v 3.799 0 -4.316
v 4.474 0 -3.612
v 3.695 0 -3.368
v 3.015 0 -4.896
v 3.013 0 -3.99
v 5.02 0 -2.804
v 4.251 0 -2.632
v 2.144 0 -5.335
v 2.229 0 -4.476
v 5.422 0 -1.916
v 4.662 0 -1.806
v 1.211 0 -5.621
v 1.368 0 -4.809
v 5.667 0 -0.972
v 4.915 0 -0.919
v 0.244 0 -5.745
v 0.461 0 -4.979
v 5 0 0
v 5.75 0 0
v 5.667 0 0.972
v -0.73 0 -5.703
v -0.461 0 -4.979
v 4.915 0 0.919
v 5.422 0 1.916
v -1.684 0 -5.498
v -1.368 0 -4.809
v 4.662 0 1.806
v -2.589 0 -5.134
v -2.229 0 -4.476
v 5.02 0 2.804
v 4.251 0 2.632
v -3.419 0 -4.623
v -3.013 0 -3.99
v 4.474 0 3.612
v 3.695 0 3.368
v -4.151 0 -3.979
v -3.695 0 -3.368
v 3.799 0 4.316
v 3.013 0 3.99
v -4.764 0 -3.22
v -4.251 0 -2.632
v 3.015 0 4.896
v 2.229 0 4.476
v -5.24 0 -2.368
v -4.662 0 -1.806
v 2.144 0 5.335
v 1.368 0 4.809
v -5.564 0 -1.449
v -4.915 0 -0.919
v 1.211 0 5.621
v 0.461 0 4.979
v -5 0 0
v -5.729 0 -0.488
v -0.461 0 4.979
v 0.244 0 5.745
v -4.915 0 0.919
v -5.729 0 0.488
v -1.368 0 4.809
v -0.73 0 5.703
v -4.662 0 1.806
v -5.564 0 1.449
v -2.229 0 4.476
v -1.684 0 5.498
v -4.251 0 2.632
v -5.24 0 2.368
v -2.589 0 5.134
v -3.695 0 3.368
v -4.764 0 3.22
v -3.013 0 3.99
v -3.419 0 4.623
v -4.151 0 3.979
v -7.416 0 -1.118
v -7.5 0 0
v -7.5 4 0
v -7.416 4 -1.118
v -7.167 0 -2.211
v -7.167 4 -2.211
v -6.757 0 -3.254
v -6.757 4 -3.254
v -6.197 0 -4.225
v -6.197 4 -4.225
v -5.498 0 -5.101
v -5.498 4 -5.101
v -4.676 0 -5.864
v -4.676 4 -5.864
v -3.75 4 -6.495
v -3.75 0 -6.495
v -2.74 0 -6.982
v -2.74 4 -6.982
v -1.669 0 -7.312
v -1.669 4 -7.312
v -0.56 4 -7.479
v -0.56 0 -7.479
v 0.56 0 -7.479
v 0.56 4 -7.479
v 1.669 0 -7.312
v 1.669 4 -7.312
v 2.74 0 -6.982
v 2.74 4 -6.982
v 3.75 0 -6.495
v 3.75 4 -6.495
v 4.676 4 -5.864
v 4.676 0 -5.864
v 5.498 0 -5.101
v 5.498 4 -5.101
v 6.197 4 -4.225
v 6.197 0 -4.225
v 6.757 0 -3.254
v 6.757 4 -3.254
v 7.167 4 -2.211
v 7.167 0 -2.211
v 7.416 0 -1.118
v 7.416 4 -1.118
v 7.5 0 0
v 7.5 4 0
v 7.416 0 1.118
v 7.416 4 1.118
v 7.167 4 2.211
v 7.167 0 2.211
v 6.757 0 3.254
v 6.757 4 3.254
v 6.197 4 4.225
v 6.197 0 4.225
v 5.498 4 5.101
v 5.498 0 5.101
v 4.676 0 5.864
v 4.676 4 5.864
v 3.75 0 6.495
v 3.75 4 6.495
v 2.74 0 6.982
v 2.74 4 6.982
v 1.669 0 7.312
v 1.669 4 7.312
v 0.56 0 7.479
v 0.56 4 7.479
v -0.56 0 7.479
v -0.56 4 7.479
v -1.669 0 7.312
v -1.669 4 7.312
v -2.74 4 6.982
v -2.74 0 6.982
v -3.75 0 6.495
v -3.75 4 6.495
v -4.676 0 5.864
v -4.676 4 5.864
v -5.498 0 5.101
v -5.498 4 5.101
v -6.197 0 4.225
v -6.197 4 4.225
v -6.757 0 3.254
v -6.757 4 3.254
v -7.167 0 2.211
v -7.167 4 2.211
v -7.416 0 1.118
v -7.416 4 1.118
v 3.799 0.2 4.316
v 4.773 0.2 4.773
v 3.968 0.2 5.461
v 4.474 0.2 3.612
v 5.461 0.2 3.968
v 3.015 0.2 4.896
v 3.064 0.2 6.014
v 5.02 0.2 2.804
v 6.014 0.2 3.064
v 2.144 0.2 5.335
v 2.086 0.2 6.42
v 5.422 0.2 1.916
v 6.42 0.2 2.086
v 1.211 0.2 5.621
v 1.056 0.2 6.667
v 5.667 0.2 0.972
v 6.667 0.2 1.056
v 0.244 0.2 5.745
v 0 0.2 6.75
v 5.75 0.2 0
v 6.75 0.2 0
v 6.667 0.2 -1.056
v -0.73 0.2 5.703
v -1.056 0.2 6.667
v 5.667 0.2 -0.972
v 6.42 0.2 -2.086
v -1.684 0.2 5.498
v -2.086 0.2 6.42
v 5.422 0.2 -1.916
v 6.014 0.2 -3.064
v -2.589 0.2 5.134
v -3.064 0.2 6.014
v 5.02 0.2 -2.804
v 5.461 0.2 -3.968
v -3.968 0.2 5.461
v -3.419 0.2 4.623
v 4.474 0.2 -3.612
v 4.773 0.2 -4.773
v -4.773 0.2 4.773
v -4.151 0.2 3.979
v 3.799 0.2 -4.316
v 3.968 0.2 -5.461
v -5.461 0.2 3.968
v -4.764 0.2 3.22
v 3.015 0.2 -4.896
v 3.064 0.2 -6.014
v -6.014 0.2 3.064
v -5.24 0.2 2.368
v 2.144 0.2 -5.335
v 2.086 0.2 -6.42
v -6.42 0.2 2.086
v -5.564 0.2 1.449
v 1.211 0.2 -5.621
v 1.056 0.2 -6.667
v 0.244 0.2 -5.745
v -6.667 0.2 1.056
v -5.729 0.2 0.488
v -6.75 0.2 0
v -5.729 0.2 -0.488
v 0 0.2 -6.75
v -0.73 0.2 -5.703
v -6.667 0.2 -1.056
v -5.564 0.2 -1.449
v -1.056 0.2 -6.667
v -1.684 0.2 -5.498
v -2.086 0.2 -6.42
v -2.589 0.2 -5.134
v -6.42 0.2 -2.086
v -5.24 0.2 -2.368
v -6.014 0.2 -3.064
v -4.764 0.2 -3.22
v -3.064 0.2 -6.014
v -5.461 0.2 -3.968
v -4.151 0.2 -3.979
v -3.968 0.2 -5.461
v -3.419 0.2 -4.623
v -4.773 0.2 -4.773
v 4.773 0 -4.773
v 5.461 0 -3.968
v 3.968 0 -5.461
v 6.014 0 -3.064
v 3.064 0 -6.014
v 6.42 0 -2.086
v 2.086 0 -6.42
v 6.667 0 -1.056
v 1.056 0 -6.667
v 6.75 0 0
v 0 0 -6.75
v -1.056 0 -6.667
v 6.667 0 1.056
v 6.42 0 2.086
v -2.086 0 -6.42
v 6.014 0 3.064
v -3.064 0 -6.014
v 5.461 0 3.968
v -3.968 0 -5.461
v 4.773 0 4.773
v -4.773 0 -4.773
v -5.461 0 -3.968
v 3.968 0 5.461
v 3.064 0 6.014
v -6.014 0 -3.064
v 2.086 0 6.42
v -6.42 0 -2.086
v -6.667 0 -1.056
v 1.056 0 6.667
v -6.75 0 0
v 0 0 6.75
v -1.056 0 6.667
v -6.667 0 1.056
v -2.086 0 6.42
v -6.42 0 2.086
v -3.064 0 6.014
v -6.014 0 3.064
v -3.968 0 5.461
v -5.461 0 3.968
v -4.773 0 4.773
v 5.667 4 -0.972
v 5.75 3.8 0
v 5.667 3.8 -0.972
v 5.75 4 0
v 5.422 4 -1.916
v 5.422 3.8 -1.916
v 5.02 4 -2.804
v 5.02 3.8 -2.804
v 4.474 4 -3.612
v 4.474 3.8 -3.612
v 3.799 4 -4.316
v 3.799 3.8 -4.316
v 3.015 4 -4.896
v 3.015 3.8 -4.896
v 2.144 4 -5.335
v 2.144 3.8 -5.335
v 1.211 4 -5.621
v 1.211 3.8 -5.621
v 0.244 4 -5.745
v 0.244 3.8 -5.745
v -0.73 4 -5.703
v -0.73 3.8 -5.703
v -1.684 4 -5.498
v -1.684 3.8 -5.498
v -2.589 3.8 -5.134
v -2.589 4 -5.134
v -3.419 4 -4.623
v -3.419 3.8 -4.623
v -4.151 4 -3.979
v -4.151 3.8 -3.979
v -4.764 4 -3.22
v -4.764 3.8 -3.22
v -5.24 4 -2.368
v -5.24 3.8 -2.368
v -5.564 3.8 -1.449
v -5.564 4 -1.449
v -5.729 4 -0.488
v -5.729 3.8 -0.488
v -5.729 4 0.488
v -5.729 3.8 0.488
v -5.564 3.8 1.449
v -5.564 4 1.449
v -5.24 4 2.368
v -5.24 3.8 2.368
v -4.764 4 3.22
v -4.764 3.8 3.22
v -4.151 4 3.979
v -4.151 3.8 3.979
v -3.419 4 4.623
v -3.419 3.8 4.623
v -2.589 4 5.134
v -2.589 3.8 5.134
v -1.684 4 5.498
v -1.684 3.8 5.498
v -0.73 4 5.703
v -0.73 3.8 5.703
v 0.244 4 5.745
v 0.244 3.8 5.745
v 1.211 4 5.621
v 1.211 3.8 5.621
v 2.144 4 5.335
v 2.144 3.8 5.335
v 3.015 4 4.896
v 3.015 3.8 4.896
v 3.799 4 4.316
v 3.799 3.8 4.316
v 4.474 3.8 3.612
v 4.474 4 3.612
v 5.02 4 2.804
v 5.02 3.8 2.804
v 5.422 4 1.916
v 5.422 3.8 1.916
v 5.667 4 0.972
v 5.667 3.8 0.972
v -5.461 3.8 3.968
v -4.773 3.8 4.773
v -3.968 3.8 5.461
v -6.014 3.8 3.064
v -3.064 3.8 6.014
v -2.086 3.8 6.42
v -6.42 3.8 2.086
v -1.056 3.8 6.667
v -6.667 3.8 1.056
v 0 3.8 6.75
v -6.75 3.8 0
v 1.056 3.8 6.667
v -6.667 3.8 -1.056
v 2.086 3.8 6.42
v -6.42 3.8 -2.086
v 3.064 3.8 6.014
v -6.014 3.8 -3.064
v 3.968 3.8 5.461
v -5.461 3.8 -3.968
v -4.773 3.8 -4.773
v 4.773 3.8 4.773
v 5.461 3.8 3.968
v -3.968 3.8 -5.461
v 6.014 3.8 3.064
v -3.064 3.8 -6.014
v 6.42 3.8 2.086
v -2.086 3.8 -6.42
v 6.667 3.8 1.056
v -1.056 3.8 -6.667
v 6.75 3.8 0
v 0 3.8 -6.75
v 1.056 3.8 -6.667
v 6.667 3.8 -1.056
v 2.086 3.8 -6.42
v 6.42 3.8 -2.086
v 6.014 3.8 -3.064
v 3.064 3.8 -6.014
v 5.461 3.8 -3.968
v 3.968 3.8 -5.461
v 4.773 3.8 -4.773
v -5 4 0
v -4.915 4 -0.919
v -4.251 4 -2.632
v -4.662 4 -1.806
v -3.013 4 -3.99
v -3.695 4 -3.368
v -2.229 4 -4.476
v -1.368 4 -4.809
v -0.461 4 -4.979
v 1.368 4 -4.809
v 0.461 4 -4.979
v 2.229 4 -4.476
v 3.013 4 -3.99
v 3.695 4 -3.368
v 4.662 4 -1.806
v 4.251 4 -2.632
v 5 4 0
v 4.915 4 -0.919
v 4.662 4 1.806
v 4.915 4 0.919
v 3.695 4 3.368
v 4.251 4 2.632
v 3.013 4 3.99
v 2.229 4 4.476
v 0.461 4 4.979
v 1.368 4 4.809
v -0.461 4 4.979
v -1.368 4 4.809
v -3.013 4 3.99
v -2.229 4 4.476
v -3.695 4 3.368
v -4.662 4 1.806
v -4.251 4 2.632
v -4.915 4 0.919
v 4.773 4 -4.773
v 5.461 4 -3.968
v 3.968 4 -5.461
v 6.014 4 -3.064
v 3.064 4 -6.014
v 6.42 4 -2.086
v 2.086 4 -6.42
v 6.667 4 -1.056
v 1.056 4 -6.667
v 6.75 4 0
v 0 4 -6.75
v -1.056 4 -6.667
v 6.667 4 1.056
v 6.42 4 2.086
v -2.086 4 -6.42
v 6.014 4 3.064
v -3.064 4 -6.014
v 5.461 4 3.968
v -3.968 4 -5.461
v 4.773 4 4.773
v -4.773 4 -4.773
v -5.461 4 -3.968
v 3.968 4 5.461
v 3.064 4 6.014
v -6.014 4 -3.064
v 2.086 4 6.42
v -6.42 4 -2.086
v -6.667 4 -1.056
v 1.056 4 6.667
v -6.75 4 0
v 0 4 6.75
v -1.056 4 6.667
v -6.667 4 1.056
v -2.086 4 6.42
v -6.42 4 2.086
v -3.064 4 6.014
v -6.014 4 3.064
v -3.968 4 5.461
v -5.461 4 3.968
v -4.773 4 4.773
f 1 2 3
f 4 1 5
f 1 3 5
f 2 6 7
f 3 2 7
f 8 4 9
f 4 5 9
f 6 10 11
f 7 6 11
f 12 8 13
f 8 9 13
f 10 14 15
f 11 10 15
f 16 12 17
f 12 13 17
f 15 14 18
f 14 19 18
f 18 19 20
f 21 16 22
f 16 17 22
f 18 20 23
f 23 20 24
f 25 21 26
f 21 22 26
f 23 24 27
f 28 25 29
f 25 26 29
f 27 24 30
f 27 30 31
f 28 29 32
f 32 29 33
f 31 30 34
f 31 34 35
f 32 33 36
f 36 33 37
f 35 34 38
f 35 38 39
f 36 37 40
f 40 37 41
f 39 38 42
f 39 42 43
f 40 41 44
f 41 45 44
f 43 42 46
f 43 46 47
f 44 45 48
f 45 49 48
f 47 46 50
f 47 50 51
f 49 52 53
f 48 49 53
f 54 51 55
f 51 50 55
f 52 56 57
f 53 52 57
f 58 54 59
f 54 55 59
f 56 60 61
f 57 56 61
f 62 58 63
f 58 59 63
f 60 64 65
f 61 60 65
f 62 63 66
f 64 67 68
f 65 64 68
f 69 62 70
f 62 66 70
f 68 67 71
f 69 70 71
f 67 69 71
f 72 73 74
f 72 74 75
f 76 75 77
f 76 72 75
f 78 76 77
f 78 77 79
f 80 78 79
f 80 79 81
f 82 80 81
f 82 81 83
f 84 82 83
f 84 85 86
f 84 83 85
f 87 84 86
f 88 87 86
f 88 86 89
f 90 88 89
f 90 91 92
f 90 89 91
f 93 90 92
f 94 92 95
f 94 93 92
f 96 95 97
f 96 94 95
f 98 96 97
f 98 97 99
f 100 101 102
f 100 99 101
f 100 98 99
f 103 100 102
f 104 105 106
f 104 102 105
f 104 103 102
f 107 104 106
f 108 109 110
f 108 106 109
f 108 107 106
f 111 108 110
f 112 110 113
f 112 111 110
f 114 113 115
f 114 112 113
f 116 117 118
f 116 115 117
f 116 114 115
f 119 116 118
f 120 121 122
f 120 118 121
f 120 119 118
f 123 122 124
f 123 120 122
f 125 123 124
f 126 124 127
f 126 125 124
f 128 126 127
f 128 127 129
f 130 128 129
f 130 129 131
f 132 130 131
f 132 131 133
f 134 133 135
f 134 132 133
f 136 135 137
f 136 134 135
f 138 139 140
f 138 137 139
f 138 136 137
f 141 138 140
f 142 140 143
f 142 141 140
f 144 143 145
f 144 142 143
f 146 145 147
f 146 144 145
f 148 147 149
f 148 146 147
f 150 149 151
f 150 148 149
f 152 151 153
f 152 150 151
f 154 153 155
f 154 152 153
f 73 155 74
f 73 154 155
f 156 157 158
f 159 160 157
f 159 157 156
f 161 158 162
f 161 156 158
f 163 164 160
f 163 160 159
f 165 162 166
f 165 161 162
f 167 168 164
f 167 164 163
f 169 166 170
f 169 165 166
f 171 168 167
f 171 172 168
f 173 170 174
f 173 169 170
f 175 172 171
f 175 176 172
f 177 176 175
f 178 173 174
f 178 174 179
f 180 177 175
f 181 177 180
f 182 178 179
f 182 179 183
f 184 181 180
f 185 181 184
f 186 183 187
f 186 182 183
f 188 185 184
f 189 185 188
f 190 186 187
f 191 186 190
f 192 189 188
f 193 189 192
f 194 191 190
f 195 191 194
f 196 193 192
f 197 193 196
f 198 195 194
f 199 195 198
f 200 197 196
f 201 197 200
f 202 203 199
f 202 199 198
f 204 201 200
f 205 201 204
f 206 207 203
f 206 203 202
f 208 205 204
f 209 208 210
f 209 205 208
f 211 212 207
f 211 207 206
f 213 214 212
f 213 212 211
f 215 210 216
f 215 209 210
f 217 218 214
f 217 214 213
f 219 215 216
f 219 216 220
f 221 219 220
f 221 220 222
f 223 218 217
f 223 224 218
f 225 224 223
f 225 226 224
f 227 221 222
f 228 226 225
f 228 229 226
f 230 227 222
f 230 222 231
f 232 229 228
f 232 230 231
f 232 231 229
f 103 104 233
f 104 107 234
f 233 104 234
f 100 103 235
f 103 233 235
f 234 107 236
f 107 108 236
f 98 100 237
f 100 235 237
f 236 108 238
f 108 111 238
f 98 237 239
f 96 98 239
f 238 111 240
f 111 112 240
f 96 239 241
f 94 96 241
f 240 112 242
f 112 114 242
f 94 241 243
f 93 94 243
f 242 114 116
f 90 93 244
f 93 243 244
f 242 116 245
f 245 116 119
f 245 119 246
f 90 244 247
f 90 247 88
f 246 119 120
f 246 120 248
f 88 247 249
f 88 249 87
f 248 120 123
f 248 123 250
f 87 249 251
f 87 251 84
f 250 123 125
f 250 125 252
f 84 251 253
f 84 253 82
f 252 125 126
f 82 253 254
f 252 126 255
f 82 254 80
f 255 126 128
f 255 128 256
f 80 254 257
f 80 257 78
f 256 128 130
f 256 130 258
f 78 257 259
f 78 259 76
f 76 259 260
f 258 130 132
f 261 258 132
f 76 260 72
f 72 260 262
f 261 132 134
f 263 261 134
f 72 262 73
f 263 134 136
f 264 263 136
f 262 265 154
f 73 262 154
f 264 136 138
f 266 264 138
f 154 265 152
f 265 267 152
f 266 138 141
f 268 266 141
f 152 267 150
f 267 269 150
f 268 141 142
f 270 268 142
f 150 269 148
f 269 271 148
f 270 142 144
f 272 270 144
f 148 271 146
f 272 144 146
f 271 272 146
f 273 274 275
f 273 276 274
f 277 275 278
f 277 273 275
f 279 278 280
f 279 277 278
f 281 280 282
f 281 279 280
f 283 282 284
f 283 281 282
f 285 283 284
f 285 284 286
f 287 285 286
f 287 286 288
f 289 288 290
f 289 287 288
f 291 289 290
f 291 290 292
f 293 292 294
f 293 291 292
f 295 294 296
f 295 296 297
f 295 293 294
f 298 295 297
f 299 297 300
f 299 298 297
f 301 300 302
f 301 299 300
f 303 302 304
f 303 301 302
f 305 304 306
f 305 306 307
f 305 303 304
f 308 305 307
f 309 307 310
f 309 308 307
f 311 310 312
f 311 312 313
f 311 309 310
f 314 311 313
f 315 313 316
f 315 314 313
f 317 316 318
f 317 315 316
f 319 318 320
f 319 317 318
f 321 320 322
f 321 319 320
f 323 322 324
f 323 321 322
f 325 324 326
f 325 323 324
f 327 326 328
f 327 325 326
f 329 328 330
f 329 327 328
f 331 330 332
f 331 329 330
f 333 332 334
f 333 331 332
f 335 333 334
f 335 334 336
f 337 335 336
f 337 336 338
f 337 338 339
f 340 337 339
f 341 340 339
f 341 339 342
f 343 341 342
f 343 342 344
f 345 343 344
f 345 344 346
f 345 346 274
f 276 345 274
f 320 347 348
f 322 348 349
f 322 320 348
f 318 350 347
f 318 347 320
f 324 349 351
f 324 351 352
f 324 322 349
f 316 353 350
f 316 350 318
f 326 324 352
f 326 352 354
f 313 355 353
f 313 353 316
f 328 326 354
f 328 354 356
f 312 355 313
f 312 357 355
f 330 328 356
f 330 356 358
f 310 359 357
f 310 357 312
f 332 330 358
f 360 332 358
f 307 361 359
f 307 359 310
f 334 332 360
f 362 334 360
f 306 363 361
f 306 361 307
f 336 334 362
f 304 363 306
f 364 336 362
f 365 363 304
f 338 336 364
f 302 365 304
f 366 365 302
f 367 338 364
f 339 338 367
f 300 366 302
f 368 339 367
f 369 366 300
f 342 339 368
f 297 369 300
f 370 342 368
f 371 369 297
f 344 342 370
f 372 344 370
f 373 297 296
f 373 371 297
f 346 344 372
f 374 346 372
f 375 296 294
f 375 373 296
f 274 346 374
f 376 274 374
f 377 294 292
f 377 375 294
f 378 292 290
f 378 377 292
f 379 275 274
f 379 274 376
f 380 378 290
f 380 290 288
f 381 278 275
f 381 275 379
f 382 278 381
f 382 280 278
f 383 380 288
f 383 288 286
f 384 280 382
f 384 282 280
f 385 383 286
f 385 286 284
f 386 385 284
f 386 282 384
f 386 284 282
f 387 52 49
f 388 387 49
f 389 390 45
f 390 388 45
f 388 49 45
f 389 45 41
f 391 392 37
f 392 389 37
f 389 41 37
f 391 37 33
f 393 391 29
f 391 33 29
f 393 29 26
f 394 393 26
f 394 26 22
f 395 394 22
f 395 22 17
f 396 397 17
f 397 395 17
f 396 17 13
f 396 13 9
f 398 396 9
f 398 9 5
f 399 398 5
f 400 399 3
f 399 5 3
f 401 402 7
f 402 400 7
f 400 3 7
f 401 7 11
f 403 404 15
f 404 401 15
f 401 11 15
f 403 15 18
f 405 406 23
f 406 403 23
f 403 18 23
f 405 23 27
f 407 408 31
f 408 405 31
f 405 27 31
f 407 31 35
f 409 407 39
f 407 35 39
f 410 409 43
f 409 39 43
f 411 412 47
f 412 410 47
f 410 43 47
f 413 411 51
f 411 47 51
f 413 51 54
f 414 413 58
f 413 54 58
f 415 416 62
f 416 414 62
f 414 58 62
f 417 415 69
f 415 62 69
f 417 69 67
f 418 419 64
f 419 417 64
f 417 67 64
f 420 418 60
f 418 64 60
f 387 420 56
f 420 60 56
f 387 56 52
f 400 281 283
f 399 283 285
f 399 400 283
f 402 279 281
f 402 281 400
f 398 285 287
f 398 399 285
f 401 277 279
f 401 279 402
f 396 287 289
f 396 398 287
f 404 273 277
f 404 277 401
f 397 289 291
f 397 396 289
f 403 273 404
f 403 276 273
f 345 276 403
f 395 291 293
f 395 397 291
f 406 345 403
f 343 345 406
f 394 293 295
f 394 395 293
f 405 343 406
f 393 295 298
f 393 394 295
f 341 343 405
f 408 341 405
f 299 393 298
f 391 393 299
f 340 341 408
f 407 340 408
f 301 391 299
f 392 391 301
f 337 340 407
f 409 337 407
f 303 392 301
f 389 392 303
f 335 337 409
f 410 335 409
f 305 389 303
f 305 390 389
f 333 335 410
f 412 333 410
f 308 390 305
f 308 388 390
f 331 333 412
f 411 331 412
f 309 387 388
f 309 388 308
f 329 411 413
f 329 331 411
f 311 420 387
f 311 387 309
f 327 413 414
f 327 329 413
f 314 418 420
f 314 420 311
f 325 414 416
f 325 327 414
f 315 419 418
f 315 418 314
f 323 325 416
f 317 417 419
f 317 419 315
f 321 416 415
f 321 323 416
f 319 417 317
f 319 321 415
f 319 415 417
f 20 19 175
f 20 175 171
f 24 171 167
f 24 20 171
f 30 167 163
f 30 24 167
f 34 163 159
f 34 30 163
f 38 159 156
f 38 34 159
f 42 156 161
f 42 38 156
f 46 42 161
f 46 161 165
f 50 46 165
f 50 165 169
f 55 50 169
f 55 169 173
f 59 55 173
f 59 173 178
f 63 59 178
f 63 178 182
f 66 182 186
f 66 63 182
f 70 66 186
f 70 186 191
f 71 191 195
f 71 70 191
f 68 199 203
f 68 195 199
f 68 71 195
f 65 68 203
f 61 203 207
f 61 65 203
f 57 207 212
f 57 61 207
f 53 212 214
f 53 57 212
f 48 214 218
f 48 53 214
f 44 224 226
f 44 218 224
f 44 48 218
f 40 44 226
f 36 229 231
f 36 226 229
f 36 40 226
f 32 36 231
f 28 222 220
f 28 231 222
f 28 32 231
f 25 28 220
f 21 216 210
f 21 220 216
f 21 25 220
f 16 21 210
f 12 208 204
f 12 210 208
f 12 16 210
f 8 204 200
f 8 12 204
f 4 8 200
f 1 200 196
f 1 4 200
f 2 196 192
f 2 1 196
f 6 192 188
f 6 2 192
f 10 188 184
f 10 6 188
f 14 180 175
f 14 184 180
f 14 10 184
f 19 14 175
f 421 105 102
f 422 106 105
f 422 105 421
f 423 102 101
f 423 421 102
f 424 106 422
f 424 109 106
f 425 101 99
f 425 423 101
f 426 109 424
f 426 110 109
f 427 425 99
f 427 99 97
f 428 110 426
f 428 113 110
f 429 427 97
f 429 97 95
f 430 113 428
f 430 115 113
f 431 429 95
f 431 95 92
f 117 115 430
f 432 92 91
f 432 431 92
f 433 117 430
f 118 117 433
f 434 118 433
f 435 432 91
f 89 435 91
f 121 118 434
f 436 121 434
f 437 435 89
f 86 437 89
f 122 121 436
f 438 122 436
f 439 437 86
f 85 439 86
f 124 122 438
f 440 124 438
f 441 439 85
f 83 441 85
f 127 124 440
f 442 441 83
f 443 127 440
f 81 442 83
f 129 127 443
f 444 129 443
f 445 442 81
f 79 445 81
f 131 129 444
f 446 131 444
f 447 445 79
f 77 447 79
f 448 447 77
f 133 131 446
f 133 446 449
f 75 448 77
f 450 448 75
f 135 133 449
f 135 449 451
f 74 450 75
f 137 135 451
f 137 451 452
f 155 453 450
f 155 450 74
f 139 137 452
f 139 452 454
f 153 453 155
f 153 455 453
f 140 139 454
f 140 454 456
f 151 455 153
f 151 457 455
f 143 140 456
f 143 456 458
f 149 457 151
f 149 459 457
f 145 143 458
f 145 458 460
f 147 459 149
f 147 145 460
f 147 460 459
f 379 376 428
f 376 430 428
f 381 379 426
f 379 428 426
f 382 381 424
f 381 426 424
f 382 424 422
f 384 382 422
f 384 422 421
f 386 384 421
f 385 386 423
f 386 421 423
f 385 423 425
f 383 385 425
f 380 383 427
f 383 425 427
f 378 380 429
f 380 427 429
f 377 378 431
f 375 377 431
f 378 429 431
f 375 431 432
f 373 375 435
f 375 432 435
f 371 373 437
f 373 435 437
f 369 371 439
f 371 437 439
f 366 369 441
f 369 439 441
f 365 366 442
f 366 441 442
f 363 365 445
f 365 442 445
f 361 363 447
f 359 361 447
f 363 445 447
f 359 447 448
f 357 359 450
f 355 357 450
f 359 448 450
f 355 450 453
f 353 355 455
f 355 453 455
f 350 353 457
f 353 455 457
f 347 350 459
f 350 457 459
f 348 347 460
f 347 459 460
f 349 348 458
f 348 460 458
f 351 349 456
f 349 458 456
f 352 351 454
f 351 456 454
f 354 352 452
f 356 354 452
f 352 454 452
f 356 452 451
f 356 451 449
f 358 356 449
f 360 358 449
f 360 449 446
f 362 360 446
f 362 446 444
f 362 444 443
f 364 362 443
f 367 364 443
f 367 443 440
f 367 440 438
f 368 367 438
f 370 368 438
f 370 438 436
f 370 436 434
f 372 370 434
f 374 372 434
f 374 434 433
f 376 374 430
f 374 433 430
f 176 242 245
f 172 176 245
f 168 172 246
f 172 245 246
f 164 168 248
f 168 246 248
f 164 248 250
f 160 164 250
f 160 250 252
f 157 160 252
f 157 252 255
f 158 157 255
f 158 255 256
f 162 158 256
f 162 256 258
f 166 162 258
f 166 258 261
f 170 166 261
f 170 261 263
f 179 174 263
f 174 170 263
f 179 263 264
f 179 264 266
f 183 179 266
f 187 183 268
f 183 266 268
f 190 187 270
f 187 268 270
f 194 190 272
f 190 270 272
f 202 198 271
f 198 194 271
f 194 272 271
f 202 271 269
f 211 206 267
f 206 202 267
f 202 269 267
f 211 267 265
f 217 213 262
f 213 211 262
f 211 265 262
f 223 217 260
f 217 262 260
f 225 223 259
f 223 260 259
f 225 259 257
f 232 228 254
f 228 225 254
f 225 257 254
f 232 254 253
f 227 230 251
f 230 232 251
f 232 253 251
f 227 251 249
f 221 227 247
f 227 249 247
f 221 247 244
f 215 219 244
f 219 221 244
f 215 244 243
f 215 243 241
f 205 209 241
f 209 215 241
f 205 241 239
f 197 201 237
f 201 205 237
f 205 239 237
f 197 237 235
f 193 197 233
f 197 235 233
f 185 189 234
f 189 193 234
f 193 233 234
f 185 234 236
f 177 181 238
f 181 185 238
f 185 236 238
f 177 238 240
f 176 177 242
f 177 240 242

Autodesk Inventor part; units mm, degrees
ref_plane "YZ Plane" through (0, 0, 0) normal (1, 0, 0) x (0, 1, 0)
ref_plane "XZ Plane" through (0, 0, 0) normal (0, 1, 0) x (-1, 0, 0)
sketch "Sketch1" plane through (0, 0, 0) normal (0, 1, 0) x (-1, 0, 0)
  circle A0 centre (0, 0) radius 5
  circle A1 centre (0, 0) radius 7.5
  dimension "d0" = 10
  dimension "d1" = 15
extrude "Extrusion1" add sketch "Sketch1" along normal blind 4
sketch "Sketch2" plane through (0, 4, 0) normal (0, 1, 0) x (1, 0, 0)
  circle A0 centre (0, 0) radius 7.5 projected
  circle A1 centre (0, 0) radius 5 projected
  circle A2 centre (0, 0) radius 5.75
  circle A3 centre (0, 0) radius 6.75
  dimension "d4" = 11.5
  dimension "d5" = 13.5
extrude "Extrusion2" cut sketch "Sketch2" against normal blind 0.2 contours A3
ref_plane "Work Plane1" through (0, 2, 0) normal (0, 1, 0) x (1, 0, 0)
mirror "Mirror1" about plane through (0, 2, 0) normal (0, 1, 0) of "Extrusion2"
properties part number "bearing10X15X4"
